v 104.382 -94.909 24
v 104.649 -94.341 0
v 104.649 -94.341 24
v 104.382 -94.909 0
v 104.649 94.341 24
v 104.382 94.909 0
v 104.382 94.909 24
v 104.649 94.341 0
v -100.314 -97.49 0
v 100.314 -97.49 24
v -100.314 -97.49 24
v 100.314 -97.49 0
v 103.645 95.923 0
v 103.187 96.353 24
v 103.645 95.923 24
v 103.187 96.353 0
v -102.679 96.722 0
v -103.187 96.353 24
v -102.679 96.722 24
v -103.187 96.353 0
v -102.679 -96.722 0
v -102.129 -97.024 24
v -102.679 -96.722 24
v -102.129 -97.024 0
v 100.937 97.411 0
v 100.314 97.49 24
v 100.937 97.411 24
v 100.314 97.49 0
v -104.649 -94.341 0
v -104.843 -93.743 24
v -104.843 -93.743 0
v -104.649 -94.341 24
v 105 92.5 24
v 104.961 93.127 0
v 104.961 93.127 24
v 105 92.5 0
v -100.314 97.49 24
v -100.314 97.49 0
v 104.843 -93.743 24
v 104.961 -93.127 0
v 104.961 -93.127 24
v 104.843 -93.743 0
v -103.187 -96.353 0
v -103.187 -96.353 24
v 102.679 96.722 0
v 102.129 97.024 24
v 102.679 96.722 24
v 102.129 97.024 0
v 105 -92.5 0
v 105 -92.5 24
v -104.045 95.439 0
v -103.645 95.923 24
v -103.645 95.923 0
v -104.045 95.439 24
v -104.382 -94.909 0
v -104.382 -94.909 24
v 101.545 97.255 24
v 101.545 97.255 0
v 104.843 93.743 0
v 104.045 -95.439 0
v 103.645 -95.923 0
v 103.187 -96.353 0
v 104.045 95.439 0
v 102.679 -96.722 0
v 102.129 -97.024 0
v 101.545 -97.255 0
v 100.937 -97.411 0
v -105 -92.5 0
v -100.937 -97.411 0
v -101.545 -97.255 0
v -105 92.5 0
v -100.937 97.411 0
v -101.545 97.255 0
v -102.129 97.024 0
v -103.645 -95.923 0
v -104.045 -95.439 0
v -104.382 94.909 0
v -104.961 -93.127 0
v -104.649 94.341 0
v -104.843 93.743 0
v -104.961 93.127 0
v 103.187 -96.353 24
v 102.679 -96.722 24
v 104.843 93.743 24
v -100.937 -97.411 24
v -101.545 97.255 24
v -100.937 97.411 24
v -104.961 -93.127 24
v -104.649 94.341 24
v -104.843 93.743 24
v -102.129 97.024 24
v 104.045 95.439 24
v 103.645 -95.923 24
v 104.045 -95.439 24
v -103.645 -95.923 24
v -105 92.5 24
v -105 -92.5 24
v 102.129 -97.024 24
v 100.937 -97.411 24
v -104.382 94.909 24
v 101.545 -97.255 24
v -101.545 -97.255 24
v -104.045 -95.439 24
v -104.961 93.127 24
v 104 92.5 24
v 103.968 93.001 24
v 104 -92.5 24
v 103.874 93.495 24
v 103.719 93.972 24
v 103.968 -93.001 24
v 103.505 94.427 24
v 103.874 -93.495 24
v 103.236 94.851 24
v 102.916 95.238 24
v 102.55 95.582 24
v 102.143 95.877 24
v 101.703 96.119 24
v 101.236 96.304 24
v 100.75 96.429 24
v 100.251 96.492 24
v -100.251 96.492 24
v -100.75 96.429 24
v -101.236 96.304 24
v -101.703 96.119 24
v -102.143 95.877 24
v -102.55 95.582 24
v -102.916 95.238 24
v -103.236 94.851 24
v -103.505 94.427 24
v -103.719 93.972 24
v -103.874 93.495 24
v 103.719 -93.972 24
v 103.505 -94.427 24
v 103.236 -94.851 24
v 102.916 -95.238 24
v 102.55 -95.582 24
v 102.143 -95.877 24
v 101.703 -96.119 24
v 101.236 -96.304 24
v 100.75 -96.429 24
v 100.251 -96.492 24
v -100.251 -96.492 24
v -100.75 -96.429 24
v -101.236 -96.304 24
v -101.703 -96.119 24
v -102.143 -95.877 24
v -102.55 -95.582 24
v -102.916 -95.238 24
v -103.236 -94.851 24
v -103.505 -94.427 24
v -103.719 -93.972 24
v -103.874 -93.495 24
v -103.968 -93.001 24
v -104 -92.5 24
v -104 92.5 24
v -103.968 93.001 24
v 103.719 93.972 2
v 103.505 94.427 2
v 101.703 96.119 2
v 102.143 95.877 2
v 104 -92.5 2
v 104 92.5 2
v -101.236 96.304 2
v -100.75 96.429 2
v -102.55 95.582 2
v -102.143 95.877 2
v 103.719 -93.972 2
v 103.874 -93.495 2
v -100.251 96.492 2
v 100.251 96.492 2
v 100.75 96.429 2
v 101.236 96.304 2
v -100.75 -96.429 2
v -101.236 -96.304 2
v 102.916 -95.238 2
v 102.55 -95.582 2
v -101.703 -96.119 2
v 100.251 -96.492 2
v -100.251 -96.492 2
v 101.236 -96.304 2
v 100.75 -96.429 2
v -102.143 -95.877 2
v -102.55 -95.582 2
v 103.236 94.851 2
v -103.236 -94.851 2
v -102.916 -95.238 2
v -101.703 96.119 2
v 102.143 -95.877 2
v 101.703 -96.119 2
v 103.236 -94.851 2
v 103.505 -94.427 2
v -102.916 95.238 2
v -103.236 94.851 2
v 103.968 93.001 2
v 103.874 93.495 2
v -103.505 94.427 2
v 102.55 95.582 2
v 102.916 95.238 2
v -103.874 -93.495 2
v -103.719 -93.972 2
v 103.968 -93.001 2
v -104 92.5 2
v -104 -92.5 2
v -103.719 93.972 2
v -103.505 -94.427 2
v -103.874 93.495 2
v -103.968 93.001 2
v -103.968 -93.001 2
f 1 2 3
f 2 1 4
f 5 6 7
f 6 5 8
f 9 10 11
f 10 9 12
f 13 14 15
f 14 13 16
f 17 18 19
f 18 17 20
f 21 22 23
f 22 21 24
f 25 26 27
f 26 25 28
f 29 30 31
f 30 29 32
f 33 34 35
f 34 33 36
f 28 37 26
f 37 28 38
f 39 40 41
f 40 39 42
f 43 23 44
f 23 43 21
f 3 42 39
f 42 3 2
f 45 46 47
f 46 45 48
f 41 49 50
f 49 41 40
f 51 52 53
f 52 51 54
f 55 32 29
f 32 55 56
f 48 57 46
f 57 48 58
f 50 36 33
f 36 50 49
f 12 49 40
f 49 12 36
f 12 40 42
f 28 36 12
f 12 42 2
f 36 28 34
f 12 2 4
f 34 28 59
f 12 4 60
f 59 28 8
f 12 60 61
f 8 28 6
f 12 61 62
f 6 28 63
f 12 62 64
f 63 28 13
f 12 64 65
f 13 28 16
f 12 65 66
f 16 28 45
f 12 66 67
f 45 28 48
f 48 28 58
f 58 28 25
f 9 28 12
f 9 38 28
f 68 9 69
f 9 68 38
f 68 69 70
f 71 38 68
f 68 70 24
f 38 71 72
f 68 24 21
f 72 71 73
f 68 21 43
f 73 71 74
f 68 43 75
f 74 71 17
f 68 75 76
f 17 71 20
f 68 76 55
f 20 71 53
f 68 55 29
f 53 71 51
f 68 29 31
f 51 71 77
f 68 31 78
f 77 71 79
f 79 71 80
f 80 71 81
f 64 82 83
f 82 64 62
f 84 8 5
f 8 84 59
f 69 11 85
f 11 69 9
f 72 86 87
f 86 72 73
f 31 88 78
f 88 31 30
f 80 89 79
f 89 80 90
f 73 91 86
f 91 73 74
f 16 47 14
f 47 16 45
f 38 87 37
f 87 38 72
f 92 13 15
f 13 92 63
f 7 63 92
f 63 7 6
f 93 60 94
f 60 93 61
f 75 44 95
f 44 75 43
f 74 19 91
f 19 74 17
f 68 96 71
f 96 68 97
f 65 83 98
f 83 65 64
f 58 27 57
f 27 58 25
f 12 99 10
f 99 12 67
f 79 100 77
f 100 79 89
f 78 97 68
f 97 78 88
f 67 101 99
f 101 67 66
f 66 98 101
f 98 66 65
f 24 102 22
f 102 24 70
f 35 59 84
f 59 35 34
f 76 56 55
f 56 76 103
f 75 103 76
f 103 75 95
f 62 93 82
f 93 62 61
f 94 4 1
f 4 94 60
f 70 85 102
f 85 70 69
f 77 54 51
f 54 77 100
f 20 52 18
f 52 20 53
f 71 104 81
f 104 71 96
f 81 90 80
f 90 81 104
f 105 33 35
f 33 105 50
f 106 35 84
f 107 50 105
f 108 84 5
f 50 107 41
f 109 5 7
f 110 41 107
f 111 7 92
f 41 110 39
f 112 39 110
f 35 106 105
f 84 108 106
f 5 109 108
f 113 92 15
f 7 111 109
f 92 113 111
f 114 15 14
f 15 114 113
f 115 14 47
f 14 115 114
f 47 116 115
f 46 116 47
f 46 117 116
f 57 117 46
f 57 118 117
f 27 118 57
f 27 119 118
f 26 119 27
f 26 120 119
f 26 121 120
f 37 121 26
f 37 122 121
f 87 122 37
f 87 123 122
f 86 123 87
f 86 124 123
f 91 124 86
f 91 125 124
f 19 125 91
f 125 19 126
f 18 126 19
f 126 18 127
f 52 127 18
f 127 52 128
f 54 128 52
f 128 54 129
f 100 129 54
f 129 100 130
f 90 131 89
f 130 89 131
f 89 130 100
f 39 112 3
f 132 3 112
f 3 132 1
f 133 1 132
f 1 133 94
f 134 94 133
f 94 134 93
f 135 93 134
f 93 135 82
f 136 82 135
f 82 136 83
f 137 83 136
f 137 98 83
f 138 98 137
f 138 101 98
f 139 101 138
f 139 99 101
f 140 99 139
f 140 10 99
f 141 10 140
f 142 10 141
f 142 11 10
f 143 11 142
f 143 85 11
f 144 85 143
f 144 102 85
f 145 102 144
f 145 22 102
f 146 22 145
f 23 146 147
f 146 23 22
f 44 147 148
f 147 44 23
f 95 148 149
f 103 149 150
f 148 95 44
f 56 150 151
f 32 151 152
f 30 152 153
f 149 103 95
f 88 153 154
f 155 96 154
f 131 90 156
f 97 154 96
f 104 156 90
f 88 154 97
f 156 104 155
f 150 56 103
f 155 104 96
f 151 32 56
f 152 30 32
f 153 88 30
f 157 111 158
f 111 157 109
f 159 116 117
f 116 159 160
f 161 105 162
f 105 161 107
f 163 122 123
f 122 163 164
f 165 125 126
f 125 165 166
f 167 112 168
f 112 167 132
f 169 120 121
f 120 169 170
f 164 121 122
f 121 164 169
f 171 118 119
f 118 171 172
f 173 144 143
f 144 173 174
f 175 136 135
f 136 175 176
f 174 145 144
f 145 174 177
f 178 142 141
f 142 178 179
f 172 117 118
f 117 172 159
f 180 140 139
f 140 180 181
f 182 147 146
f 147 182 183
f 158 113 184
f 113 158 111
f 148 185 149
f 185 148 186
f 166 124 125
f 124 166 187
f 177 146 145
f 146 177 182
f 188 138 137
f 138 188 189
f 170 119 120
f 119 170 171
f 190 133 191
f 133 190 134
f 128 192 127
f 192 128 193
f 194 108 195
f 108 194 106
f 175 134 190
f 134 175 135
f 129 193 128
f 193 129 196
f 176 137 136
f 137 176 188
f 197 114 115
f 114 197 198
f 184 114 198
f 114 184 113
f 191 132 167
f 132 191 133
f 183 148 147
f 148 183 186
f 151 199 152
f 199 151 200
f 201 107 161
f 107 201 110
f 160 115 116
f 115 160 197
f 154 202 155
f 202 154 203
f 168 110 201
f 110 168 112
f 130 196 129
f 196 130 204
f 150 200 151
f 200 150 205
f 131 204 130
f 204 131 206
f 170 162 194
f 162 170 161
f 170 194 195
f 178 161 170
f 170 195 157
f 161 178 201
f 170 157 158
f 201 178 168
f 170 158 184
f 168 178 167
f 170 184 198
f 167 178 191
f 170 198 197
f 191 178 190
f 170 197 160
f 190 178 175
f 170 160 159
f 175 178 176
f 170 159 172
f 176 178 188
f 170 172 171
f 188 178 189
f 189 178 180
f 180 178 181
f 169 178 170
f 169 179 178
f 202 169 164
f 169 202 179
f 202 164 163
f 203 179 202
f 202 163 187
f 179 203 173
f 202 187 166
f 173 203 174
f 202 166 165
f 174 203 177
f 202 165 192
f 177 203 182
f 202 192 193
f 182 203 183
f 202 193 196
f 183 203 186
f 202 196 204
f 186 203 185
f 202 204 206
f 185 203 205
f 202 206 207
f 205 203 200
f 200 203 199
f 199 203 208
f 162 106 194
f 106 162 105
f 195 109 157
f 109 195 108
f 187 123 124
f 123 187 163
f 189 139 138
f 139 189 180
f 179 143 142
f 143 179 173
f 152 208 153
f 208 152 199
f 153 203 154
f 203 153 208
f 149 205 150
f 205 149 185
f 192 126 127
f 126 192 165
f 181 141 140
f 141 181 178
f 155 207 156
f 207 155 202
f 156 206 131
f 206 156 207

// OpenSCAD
$fn = 50;


difference() {
	union() {
		hull() {
			translate(v = [-100.0000000000, 92.5000000000, 0]) {
				cylinder(h = 24, r = 5);
			}
			translate(v = [100.0000000000, 92.5000000000, 0]) {
				cylinder(h = 24, r = 5);
			}
			translate(v = [-100.0000000000, -92.5000000000, 0]) {
				cylinder(h = 24, r = 5);
			}
			translate(v = [100.0000000000, -92.5000000000, 0]) {
				cylinder(h = 24, r = 5);
			}
		}
	}
	union() {
		translate(v = [0, 0, 2]) {
			hull() {
				translate(v = [-100.0000000000, 92.5000000000, 0]) {
					cylinder(h = 22, r = 4);
				}
				translate(v = [100.0000000000, 92.5000000000, 0]) {
					cylinder(h = 22, r = 4);
				}
				translate(v = [-100.0000000000, -92.5000000000, 0]) {
					cylinder(h = 22, r = 4);
				}
				translate(v = [100.0000000000, -92.5000000000, 0]) {
					cylinder(h = 22, r = 4);
				}
			}
		}
	}
}
